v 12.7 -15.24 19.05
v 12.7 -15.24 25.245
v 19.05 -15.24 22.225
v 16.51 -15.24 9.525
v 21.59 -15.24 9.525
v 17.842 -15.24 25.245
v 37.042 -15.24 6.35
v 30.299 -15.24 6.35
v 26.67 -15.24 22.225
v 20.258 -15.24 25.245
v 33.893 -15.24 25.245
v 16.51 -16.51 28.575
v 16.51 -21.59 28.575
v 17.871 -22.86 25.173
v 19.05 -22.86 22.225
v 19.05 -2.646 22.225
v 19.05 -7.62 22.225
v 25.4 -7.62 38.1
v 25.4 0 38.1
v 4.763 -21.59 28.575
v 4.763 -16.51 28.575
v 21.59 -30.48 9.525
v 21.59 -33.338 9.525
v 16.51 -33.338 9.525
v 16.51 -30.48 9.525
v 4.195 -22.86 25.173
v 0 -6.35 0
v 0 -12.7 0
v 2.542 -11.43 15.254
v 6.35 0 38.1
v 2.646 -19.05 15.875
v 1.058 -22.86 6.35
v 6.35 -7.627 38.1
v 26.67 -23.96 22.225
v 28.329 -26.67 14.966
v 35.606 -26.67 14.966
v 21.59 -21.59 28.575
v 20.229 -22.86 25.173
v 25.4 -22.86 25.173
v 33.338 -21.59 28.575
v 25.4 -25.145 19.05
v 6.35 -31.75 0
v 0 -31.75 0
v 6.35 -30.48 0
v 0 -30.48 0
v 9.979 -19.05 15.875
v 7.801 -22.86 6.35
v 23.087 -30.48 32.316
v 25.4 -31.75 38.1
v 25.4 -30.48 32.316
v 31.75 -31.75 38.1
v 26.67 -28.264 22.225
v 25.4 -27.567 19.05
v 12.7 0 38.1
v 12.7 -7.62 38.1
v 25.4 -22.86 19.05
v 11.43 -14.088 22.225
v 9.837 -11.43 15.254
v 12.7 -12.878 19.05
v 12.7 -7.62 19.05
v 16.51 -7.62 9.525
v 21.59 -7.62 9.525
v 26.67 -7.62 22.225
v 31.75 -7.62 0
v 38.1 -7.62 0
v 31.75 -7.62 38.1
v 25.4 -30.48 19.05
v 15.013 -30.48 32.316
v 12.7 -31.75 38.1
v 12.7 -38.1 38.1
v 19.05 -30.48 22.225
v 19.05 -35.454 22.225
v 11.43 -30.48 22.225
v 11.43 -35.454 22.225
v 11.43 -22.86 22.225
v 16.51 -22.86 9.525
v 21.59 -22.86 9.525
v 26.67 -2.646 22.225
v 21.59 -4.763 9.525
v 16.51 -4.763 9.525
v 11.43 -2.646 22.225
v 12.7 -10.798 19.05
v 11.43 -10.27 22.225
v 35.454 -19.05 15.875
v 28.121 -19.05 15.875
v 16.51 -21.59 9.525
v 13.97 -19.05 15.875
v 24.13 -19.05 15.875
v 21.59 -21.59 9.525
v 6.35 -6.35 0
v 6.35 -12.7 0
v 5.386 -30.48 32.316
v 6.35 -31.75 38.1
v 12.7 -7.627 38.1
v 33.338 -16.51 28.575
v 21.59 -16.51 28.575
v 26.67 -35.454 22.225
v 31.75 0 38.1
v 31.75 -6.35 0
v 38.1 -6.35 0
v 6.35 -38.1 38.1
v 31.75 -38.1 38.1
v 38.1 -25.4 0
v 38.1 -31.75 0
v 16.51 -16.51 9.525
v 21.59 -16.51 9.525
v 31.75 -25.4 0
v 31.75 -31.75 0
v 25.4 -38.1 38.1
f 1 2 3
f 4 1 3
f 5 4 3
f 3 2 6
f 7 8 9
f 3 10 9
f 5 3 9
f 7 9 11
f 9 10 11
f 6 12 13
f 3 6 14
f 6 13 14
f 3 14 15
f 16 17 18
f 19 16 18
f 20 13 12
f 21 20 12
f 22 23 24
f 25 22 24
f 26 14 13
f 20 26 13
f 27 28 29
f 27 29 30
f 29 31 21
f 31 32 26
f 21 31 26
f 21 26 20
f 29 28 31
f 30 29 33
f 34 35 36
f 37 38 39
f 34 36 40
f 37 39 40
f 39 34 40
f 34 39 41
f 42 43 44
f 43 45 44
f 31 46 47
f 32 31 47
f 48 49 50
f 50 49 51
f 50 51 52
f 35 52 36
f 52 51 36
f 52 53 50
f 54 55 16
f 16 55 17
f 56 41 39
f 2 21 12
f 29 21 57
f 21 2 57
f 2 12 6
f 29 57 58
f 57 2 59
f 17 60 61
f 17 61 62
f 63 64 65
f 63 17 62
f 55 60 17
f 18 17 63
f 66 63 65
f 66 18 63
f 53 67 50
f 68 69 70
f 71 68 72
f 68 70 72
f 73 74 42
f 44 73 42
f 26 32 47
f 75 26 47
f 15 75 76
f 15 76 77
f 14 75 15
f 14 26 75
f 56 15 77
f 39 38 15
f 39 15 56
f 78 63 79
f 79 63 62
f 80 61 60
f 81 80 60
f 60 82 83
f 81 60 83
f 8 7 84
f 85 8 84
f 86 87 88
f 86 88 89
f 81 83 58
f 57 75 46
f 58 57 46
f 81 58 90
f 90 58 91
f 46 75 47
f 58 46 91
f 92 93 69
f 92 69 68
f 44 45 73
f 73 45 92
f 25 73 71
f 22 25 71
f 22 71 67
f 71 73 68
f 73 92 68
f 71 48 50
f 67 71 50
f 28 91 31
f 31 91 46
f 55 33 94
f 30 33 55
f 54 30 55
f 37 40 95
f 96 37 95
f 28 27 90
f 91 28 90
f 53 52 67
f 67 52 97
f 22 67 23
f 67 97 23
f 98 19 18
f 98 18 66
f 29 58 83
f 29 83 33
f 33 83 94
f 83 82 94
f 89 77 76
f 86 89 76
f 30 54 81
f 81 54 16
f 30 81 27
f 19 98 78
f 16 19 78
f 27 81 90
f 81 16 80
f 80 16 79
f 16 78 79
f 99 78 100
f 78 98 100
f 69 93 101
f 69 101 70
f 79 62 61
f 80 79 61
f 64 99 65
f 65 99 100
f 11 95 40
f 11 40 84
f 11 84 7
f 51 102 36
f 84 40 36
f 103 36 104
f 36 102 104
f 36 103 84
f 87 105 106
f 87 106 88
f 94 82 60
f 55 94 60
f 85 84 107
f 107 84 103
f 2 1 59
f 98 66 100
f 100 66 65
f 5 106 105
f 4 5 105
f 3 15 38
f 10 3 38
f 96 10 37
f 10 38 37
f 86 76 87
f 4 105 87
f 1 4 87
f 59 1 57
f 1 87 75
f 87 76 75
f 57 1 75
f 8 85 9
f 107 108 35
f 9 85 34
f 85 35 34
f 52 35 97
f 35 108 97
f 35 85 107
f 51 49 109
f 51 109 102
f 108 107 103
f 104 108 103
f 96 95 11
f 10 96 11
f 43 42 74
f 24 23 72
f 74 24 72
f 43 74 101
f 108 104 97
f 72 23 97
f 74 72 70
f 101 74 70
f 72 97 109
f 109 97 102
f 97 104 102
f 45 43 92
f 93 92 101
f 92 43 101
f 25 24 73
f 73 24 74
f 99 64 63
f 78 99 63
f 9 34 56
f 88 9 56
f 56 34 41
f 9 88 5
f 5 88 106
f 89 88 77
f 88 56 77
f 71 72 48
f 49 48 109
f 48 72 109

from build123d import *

# Parameters (mm, degrees)
F0_W      = 38.1
F0_H      = 38.1
F1_DEPTH  = 38.1
F6_DEPTH  = 38.1
F8_DEPTH  = 38.1
F9_W      = 25.4
F9_H      = 7.62
F10_DEPTH = 38.1


with BuildPart() as f1:
    # F0 (on Front) → F1 (new body)
    with BuildSketch(Plane.XZ):
        with Locations((19.05, 19.05)):
            Rectangle(F0_W, F0_H)
    extrude(amount=F1_DEPTH)

    # F5 (on offset) → F6 (cut)
    with BuildSketch(Plane.YZ.offset(38.1)):
        Polygon((-11.43, 15.253705), (-7.626852, 38.1), (-31.75, 38.1), (-26.67, 14.965899), (-21.59, 28.575), (-16.51, 28.575), align=None)
        Polygon((-31.75, 0), (-38.1, 38.1), (-38.1, 0), align=None)
        Polygon((-25.4, 0), (-12.7, 0), (-19.05, 15.875), align=None)
        Polygon((-6.35, 0), (0, 0), (0, 38.1), align=None)
    extrude(amount=-F6_DEPTH, mode=Mode.SUBTRACT)

    # F7 (on offset) → F8 (cut)
    with BuildSketch(Plane.XZ.offset(38.1)):
        Polygon((6.35, 38.1), (0, 38.1), (0, 0), align=None)
        Polygon((25.4, 38.1), (12.7, 38.1), (19.05, 22.225), align=None)
        Polygon((38.1, 38.1), (31.75, 38.1), (38.1, 0), align=None)
        Polygon((11.43, 22.225), (6.35, 0), (31.75, 0), (26.67, 22.225), (21.59, 9.525), (16.51, 9.525), align=None)
    extrude(amount=-F8_DEPTH, mode=Mode.SUBTRACT)

    # F9 (on offset) → F10 (cut)
    with BuildSketch(Plane.XY.offset(38.1)):
        with Locations((25.4, -11.43)):
            Rectangle(F9_W, F9_H)
        with Locations((12.7, -26.67)):
            Rectangle(F9_W, F9_H)
    extrude(amount=-F10_DEPTH, mode=Mode.SUBTRACT)


solid = f1.part
